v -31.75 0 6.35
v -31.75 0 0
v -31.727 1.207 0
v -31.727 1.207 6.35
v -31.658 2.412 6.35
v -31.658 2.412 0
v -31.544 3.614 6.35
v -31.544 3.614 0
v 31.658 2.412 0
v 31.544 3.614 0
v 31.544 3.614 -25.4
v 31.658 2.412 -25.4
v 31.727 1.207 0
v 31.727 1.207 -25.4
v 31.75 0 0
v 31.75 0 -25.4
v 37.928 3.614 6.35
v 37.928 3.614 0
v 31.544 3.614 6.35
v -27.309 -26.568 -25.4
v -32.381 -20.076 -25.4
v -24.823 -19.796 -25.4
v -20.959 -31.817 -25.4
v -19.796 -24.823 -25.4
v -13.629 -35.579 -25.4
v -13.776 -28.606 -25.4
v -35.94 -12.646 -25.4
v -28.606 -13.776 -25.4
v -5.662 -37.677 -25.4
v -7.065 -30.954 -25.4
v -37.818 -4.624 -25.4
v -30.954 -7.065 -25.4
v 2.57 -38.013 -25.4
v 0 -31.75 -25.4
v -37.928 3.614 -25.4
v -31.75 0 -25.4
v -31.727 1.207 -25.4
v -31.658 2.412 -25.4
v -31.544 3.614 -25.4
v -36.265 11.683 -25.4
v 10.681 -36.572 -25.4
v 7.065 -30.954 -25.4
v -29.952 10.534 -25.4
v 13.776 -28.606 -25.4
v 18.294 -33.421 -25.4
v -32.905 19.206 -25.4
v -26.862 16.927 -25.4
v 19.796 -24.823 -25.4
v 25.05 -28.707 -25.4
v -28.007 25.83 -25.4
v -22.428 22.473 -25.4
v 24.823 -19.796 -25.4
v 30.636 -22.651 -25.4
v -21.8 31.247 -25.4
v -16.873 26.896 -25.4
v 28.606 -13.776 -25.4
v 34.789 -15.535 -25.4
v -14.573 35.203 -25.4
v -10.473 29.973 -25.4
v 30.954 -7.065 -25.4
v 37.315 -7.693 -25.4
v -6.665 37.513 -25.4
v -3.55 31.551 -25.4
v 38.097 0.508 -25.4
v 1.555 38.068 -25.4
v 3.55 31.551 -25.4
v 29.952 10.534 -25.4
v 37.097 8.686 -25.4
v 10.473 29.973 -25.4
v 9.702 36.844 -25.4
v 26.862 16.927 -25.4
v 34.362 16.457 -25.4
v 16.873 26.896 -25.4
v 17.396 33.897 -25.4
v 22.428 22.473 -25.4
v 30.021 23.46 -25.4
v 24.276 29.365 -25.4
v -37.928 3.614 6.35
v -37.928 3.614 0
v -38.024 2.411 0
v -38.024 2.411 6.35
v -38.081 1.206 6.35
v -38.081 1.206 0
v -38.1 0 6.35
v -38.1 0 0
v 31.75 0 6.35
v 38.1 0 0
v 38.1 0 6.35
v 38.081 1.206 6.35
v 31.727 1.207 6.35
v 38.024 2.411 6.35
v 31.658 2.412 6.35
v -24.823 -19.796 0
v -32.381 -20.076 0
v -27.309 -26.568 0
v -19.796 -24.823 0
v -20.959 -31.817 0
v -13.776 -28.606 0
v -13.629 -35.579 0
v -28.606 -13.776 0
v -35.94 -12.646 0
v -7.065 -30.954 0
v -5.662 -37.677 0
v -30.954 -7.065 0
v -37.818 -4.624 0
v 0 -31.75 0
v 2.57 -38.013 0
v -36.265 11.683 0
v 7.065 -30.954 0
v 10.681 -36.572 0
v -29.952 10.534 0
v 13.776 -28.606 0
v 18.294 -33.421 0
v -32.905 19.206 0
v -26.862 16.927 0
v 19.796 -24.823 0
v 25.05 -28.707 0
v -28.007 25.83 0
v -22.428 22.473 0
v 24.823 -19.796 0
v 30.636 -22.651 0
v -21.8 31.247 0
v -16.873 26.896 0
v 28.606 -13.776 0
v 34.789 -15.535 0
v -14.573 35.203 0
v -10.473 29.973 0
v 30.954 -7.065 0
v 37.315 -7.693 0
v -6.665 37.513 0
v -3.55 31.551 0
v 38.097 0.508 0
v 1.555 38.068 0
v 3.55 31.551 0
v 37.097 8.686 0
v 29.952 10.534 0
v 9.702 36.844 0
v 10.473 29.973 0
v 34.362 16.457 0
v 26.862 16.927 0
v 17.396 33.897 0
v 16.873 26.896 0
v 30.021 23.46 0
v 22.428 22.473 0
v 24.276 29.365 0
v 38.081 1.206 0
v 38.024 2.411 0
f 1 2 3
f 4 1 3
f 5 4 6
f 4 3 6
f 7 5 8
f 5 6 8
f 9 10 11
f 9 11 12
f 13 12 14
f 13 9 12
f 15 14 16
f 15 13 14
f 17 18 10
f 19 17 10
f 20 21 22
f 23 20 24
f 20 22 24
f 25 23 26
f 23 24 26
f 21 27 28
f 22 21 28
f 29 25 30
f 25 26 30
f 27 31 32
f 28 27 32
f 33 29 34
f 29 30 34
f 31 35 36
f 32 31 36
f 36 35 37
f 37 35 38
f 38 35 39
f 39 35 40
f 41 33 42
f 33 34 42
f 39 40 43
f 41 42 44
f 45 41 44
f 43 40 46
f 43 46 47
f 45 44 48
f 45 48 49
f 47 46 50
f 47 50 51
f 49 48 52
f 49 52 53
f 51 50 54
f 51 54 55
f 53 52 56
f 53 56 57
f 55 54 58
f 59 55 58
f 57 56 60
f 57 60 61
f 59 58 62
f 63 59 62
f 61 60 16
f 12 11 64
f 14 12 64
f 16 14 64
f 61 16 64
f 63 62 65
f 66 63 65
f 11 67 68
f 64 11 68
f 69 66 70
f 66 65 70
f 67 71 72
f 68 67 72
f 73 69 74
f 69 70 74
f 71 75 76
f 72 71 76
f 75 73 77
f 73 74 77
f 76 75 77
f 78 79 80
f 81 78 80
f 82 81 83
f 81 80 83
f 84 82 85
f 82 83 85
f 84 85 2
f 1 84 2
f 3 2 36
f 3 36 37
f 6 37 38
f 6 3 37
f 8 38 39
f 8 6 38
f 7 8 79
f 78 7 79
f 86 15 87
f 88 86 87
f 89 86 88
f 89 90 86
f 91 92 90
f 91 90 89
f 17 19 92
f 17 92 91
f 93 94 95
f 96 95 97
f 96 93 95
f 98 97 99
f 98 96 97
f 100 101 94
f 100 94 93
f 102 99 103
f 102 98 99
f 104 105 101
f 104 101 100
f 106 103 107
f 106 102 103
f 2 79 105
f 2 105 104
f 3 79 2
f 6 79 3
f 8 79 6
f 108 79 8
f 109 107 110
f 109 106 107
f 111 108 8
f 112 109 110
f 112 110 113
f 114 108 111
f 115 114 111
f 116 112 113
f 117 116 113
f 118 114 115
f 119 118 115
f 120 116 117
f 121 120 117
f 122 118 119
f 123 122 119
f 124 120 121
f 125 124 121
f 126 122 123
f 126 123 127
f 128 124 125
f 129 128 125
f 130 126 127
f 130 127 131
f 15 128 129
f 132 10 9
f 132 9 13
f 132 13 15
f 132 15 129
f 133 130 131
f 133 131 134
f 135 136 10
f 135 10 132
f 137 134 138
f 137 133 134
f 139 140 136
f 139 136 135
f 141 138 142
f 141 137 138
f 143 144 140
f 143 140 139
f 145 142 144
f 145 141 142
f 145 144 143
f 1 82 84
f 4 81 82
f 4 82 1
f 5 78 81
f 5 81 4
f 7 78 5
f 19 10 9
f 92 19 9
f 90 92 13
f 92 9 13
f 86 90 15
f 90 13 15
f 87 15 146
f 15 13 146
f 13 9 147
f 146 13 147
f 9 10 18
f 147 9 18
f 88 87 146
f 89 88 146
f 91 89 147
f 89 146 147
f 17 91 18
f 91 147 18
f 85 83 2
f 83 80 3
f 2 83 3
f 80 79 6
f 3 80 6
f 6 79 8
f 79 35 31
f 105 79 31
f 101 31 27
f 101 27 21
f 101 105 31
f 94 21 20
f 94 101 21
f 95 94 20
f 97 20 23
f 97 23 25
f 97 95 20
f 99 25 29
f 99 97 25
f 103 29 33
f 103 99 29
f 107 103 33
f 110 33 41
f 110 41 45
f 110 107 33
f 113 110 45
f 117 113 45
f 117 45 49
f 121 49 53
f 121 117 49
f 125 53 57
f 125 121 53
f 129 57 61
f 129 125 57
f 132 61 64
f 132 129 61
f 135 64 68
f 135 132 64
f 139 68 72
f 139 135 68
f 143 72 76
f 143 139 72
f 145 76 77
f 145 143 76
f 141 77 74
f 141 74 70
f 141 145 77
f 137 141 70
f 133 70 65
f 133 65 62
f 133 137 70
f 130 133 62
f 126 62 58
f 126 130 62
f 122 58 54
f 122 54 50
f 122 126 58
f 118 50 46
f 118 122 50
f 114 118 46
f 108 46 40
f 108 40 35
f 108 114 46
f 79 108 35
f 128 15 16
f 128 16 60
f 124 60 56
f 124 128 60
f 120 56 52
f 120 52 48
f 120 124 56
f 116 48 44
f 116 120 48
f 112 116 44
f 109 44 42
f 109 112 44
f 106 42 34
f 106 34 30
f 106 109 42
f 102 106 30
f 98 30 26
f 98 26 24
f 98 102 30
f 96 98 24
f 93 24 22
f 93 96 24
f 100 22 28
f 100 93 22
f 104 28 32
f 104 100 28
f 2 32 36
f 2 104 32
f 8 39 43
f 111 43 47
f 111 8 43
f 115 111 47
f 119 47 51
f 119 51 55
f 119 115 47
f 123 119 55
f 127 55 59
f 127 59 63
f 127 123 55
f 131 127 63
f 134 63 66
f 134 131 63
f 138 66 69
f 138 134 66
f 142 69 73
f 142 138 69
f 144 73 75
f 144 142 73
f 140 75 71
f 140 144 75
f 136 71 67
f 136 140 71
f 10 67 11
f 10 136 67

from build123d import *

# Parameters (mm, degrees)
F1_DEPTH = 6.35
F2_DEPTH = 25.4


with BuildPart() as f1:
    # F0 (on Top) → F1 (new body)
    with BuildSketch(Plane.XY):
        with BuildLine():
            Line((31.75, 0), (38.1, 0))
            ThreePointArc((38.1, 0), (38.0570298857, 1.8089986952), (37.9282164683, 3.6139169242))
            Line((37.9282164683, 3.6139169242), (31.5436539492, 3.6139169242))
            ThreePointArc((31.5436539492, 3.6139169242), (31.6983715109, 1.8099015324), (31.75, 0))
        make_face()
    extrude(amount=F1_DEPTH)


with BuildPart() as f1b:
    # F0 (on Top) → F1, piece 2 (new body)
    with BuildSketch(Plane.XY):
        with BuildLine():
            ThreePointArc((-37.9282164683, 3.6139169242), (-38.0570298857, 1.8089986952), (-38.1, 0))
            Line((-38.1, 0), (-31.75, 0))
            ThreePointArc((-31.75, 0), (-31.6983715109, 1.8099015324), (-31.5436539492, 3.6139169242))
            Line((-31.5436539492, 3.6139169242), (-37.9282164683, 3.6139169242))
        make_face()
    extrude(amount=F1_DEPTH)


with BuildPart() as f2:
    # F0 (on Top) → F2 (new body)
    with BuildSketch(Plane.XY):
        with BuildLine():
            Line((31.75, 0), (38.1, 0))
            ThreePointArc((38.1, 0), (38.0570298857, 1.8089986952), (37.9282164683, 3.6139169242))
            Line((37.9282164683, 3.6139169242), (31.5436539492, 3.6139169242))
            ThreePointArc((31.5436539492, 3.6139169242), (31.6983715109, 1.8099015324), (31.75, 0))
        make_face()
        with BuildLine():
            ThreePointArc((-38.1, 0), (0, -38.1), (38.1, 0))
            Line((38.1, 0), (31.75, 0))
            ThreePointArc((31.75, 0), (0, -31.75), (-31.75, 0))
            Line((-31.75, 0), (-38.1, 0))
        make_face()
        with BuildLine():
            Line((31.5436539492, 3.6139169242), (37.9282164683, 3.6139169242))
            ThreePointArc((37.9282164683, 3.6139169242), (0, 38.1), (-37.9282164683, 3.6139169242))
            Line((-37.9282164683, 3.6139169242), (-31.5436539492, 3.6139169242))
            ThreePointArc((-31.5436539492, 3.6139169242), (0, 31.75), (31.5436539492, 3.6139169242))
        make_face()
        with BuildLine():
            ThreePointArc((-37.9282164683, 3.6139169242), (-38.0570298857, 1.8089986952), (-38.1, 0))
            Line((-38.1, 0), (-31.75, 0))
            ThreePointArc((-31.75, 0), (-31.6983715109, 1.8099015324), (-31.5436539492, 3.6139169242))
            Line((-31.5436539492, 3.6139169242), (-37.9282164683, 3.6139169242))
        make_face()
    extrude(amount=-F2_DEPTH)


solid = Compound([f1.part, f1b.part, f2.part])
